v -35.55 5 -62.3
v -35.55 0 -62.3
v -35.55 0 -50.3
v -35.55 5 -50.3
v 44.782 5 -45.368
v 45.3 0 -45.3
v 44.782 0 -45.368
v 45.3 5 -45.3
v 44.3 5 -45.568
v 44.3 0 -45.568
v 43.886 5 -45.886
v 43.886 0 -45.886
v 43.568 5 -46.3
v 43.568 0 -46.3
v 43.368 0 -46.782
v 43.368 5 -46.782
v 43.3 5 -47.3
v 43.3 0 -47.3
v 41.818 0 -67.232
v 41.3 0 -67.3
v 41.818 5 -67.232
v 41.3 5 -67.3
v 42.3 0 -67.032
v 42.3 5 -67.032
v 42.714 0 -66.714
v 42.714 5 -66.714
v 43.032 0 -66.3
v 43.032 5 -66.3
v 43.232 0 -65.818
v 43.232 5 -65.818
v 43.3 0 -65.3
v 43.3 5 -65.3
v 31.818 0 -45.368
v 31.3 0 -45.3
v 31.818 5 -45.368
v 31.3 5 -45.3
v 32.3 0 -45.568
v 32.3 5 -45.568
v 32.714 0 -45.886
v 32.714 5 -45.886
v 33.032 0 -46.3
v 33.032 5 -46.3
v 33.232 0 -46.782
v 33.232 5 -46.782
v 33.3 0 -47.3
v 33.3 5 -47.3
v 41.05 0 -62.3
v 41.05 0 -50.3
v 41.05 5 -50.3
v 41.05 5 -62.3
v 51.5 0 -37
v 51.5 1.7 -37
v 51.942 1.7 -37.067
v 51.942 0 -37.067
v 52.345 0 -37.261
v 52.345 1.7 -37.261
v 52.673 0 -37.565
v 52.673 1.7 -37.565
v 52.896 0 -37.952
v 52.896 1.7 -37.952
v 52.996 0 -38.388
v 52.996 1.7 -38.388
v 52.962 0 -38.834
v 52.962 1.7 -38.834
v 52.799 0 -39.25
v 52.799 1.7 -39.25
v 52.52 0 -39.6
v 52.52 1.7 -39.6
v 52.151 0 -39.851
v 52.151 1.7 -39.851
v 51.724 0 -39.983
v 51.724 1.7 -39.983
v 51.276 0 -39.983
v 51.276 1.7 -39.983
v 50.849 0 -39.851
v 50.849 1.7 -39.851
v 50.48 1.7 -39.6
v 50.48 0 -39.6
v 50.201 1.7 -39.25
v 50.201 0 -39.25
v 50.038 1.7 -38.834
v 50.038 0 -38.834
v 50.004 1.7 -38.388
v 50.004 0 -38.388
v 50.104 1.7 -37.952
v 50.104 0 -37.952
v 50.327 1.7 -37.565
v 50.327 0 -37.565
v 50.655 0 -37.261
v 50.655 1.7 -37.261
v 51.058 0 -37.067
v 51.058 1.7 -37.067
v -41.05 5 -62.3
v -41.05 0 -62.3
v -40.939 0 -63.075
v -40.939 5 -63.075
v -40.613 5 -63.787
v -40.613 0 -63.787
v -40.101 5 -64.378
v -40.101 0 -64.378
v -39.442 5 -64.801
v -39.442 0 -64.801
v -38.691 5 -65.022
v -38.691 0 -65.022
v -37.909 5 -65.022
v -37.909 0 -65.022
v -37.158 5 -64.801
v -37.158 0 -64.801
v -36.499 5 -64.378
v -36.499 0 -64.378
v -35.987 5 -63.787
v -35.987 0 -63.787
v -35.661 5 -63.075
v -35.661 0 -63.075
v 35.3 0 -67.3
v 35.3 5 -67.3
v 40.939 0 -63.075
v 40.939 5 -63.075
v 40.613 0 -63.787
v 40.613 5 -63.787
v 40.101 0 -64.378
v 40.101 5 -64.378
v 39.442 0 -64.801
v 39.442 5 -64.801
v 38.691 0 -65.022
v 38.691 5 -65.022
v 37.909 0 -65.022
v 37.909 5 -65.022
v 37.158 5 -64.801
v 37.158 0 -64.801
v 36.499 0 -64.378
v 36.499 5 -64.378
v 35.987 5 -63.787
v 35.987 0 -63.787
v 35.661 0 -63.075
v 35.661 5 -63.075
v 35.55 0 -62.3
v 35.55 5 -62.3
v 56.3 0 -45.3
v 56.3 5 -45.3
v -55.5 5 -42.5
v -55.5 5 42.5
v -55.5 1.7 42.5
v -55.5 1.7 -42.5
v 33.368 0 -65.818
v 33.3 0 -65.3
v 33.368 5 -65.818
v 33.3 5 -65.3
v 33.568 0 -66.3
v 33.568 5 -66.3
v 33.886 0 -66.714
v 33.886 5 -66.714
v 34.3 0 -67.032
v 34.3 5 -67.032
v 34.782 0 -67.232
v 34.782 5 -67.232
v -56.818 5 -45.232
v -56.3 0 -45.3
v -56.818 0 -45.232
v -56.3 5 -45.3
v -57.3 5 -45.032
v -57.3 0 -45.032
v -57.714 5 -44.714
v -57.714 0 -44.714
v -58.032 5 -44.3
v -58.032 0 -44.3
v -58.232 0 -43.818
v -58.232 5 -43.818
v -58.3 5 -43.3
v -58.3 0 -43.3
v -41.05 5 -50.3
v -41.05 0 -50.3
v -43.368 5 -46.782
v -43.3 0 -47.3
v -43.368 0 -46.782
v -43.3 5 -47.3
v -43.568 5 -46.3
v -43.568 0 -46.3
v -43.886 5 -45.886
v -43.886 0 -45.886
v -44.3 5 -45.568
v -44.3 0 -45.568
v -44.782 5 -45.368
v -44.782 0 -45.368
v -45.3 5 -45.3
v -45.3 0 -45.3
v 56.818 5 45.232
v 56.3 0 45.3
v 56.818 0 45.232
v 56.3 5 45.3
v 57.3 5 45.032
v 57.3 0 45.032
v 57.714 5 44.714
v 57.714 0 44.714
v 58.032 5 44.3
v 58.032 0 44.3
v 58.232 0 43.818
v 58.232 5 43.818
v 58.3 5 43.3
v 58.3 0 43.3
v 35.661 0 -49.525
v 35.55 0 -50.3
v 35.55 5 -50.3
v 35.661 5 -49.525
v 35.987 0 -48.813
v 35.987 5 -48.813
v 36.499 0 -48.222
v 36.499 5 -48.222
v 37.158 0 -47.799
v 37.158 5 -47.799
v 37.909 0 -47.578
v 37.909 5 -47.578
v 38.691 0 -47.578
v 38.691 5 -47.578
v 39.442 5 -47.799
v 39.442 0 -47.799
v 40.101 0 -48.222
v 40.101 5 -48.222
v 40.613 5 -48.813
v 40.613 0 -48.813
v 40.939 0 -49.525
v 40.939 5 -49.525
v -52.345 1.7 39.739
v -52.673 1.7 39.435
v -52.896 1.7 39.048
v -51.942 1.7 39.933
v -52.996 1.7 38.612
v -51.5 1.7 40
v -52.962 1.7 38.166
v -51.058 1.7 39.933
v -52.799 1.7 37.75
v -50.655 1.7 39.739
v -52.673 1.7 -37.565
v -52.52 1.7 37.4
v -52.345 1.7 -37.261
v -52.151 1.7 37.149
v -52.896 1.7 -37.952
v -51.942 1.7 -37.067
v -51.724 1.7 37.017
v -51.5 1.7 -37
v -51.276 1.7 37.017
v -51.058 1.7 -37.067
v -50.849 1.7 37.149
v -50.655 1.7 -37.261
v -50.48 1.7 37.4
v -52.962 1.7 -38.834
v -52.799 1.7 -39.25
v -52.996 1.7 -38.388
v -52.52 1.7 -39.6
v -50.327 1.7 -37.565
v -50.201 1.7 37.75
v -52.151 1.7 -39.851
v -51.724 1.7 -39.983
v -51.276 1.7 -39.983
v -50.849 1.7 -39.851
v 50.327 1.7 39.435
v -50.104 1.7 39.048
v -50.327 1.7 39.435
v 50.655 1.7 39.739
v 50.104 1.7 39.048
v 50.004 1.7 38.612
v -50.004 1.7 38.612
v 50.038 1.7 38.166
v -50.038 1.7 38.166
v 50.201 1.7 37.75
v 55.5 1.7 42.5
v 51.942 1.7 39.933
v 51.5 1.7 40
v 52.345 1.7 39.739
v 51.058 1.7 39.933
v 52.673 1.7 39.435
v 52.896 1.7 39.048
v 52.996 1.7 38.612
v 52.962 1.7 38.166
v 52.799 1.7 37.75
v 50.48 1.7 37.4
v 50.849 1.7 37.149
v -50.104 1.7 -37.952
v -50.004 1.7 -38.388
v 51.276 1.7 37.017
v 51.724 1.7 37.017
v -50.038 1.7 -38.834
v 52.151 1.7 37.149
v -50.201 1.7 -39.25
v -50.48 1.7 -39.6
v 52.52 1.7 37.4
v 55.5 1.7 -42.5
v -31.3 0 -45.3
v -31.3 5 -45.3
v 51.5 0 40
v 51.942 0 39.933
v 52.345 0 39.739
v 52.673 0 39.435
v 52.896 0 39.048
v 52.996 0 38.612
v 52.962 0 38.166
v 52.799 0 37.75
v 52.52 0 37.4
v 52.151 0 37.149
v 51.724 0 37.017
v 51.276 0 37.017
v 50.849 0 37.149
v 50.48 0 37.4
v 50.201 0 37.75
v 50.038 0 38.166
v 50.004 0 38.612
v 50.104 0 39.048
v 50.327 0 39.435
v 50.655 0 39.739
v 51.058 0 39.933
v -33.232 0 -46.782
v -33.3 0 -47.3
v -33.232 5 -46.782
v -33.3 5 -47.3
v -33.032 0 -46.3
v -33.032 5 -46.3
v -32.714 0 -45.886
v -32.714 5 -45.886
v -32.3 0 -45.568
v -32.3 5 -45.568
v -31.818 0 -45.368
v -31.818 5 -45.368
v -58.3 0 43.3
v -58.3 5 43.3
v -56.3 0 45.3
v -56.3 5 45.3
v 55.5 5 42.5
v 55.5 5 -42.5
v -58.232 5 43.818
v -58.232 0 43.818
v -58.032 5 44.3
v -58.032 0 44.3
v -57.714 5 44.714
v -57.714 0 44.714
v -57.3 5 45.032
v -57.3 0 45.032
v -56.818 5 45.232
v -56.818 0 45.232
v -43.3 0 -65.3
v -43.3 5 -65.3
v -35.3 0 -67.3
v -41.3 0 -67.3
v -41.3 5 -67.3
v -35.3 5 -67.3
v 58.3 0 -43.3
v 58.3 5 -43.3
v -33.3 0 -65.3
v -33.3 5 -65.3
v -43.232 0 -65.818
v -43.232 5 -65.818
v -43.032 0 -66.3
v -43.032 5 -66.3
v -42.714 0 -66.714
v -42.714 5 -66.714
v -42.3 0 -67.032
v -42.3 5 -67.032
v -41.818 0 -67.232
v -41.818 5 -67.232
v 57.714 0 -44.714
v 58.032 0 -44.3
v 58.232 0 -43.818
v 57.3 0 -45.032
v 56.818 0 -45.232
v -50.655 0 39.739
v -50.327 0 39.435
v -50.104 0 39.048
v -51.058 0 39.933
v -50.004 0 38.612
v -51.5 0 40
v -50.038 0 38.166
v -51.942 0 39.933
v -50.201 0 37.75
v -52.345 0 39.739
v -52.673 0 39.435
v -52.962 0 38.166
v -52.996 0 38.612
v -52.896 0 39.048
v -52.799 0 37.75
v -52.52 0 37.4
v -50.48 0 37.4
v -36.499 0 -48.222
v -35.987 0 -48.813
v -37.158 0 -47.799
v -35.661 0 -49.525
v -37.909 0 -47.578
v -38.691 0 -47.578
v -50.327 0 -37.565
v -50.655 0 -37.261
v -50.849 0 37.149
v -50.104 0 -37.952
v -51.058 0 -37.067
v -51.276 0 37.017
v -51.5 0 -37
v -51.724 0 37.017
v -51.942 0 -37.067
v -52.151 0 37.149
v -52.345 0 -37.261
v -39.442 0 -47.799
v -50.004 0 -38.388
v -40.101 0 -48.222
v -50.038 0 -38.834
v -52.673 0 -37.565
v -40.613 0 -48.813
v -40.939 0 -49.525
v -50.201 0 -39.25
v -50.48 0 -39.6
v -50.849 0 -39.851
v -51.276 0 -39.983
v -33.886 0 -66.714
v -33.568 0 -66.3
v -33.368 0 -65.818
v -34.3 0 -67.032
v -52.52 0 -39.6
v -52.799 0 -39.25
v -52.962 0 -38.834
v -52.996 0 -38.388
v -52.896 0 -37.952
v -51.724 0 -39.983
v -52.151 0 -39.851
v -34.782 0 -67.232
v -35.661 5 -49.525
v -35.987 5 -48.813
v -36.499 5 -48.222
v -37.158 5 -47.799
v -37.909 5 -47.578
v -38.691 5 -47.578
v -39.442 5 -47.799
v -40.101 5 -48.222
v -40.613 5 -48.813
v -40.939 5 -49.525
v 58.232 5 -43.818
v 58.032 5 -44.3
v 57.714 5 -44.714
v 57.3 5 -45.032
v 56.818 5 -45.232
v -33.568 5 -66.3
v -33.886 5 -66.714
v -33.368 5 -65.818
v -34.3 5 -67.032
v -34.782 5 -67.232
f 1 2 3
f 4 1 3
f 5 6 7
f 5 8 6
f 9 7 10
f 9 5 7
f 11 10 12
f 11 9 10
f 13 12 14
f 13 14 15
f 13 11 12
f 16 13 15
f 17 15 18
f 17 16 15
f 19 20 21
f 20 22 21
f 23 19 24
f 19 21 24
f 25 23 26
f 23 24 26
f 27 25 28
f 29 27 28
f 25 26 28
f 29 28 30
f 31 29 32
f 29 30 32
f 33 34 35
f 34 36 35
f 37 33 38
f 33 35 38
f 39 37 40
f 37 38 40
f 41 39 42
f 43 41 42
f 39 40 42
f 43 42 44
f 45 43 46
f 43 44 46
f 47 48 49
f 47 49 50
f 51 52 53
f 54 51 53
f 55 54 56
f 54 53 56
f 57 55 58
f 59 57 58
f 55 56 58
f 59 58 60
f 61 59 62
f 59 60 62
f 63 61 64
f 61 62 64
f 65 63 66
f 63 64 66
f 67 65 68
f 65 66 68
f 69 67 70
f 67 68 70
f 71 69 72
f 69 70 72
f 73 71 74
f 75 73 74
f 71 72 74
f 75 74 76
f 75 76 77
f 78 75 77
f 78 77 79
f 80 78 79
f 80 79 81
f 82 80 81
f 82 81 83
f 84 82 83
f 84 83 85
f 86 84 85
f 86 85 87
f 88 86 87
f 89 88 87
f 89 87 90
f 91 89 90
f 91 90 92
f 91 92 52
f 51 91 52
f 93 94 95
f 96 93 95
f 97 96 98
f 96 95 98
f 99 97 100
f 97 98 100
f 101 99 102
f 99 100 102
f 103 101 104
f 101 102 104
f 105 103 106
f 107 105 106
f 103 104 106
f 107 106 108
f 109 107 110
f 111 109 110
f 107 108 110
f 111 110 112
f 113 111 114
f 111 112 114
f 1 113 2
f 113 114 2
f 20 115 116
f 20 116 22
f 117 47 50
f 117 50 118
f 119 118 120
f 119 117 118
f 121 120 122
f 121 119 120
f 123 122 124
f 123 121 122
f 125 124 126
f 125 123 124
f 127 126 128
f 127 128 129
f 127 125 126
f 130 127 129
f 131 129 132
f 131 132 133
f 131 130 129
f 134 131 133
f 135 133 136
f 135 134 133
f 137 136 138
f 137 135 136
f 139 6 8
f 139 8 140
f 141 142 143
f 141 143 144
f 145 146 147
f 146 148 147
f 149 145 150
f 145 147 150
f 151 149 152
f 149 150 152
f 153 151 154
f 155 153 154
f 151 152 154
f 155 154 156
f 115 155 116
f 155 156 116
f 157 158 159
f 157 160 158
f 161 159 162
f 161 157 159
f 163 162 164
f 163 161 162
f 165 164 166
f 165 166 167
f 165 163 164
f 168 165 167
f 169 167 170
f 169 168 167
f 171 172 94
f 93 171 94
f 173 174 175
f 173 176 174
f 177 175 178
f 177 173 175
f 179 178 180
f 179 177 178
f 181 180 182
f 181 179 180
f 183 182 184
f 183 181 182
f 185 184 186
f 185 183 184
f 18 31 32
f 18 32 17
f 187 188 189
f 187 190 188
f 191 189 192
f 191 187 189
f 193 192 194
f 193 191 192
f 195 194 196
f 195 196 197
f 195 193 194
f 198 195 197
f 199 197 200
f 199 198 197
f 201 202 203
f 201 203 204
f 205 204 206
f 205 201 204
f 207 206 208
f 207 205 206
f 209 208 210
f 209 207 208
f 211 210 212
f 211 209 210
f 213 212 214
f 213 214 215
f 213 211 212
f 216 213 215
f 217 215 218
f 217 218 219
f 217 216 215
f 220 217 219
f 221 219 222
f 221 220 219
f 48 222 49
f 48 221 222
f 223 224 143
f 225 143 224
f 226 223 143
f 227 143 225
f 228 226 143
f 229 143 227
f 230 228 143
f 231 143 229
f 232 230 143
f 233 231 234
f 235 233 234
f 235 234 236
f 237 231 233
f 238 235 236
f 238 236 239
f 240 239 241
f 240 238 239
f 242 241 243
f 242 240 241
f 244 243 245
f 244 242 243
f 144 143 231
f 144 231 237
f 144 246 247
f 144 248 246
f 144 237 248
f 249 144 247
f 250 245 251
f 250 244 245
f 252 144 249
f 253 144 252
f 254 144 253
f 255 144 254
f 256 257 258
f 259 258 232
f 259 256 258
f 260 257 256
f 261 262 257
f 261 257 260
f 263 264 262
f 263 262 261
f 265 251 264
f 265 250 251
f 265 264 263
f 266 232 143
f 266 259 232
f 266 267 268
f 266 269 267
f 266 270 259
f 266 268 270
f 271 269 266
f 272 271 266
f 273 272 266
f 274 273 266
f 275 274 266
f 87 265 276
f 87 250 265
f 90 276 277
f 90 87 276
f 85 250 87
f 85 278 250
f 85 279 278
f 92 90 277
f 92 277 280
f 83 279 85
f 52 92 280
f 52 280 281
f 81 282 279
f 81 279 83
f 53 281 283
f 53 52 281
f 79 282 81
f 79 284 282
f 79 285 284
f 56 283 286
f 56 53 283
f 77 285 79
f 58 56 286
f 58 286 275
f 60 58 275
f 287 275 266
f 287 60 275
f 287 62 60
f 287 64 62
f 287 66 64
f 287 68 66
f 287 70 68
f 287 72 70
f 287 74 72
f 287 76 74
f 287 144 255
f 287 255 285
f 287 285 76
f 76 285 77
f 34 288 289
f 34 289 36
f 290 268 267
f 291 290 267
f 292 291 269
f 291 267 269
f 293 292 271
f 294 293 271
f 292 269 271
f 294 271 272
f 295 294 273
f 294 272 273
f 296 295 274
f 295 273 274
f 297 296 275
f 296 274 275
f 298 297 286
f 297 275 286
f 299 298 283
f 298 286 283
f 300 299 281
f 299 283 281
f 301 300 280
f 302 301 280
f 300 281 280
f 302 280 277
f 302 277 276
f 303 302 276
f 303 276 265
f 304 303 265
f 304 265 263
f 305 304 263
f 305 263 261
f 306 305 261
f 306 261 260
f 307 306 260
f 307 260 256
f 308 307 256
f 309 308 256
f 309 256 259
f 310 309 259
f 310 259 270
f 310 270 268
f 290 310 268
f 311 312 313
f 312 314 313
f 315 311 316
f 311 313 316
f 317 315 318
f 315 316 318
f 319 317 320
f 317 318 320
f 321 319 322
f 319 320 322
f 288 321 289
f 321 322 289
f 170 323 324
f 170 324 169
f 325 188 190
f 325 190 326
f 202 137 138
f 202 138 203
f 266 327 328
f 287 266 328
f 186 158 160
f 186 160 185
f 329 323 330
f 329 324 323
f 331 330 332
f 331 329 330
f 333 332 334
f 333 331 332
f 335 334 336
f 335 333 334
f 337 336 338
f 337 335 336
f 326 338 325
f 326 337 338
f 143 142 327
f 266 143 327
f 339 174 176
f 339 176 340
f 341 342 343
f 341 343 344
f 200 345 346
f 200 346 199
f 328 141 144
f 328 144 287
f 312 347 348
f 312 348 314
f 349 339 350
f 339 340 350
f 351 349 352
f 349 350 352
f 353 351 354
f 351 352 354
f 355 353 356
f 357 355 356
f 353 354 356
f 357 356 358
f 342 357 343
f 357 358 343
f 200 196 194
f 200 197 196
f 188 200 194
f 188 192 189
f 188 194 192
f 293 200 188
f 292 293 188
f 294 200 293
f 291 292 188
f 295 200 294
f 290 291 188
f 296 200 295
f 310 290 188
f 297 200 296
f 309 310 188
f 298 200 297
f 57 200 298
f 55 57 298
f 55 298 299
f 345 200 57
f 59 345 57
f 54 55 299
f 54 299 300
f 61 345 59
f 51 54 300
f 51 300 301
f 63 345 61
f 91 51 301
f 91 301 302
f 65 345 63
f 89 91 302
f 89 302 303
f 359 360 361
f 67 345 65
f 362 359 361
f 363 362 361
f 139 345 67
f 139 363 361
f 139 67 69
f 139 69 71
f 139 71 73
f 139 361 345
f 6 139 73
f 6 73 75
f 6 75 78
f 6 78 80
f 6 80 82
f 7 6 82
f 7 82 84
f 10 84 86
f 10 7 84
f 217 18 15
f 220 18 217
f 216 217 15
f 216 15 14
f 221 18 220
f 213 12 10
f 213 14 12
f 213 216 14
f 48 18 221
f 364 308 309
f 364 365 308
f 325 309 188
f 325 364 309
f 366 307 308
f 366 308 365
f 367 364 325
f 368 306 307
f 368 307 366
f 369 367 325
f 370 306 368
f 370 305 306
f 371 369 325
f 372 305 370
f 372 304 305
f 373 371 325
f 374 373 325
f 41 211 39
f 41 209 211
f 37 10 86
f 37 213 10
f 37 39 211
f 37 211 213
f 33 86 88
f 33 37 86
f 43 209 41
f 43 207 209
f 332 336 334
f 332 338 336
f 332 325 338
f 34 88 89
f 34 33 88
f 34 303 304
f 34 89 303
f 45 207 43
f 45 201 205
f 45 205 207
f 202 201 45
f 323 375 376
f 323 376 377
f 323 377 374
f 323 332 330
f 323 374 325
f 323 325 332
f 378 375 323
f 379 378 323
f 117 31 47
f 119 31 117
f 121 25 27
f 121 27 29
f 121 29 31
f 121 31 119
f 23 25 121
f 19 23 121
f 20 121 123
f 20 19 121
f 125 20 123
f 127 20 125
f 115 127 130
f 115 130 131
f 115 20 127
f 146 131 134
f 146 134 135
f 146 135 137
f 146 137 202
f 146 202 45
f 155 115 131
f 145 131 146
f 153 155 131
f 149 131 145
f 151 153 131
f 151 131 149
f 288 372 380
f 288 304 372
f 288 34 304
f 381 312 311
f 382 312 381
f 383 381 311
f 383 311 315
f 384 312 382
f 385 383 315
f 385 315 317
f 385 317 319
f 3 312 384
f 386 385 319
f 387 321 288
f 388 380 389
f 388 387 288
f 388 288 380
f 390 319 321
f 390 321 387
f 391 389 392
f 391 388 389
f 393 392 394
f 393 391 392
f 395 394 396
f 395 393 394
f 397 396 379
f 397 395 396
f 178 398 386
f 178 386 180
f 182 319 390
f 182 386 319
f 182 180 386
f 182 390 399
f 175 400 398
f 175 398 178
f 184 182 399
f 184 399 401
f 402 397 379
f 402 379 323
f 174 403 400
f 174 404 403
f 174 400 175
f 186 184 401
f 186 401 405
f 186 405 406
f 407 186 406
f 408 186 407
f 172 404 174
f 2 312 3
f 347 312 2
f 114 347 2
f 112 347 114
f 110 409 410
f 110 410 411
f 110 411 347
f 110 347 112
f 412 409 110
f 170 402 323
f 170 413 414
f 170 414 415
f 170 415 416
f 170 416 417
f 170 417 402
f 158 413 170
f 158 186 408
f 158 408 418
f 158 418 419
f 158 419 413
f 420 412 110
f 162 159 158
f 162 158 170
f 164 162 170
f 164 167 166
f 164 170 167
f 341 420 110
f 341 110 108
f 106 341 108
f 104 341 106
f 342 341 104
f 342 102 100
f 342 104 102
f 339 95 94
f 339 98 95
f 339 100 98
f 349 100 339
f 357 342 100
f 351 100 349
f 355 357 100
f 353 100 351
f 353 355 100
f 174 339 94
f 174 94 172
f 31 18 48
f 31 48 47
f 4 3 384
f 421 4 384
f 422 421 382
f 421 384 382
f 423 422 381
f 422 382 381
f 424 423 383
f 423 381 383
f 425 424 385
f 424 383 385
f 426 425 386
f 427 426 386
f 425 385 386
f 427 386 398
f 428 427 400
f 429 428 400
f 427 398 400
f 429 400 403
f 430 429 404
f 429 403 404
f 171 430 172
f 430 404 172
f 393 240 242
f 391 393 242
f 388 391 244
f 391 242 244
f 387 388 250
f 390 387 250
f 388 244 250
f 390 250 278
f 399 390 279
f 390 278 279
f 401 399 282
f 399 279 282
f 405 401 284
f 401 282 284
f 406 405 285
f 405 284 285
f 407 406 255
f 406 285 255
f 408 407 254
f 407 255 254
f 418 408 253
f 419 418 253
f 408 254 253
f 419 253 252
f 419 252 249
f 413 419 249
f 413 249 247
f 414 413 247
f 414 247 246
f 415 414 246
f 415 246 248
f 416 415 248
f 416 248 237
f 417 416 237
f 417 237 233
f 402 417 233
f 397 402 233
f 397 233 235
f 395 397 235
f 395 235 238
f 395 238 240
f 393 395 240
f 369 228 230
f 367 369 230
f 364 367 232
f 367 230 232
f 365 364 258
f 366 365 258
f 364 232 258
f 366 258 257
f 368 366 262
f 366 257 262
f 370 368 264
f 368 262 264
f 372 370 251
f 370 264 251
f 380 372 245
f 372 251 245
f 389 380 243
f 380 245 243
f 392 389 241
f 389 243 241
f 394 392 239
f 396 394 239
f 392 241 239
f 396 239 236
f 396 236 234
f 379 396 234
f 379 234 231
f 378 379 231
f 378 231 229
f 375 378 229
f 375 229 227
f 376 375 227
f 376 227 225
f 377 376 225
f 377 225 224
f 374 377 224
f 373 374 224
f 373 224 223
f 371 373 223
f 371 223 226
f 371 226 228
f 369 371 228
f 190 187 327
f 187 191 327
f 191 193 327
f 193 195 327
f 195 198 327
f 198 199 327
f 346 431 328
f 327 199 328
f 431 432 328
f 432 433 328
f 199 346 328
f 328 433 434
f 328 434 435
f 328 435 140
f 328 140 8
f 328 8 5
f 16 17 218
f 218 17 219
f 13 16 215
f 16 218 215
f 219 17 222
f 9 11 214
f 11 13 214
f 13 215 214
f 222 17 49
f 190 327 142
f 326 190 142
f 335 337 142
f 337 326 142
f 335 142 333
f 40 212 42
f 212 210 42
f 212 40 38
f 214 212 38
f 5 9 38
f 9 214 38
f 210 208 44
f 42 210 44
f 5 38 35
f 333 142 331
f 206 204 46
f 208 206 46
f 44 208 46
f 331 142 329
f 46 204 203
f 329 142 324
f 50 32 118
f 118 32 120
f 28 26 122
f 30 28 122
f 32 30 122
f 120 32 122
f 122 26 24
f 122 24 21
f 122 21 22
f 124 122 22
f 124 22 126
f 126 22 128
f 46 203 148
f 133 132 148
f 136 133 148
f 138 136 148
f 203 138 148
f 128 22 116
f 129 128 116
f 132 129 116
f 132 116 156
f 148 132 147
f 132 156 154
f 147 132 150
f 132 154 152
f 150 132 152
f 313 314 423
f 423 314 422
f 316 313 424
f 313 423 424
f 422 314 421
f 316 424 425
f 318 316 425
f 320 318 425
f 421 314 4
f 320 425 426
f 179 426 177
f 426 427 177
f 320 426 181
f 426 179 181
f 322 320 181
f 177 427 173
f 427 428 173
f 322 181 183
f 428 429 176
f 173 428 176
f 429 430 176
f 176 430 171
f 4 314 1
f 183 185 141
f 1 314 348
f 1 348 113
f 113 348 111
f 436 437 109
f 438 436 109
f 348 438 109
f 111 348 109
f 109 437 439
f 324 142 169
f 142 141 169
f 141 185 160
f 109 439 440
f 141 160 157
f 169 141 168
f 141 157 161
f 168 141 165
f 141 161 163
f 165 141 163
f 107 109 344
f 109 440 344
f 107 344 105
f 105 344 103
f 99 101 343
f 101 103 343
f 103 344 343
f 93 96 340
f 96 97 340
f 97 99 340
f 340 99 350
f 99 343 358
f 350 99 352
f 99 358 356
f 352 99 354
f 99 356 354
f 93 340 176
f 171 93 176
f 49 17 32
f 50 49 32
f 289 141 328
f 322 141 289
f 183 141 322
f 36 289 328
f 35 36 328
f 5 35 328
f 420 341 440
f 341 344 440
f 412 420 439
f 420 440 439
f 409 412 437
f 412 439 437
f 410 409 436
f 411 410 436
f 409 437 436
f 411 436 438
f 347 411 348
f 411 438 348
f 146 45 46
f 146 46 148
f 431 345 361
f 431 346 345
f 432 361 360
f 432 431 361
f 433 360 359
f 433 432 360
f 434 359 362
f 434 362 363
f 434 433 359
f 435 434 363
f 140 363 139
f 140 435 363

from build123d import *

# Parameters (mm, degrees)
EXTRUDE_1_DEPTH     = 5
SKETCH_4_R          = 1.5
CUT_EXTRUDE_4_DEPTH = 90.180603272
SKETCH_4_3_W        = 111
SKETCH_4_3_H        = 85
SKETCH_4_3_R        = 1.5
CUT_EXTRUDE_5_DEPTH = 3.3
FILLET_1_R          = 2


with BuildPart() as part:
    # 草图2 → 凸台-拉伸1 (new body)
    with BuildSketch(Plane(origin=(0, 0, 0), x_dir=(1, 0, 0), z_dir=(0, 1, 0))):
        Polygon((-43.3, 45.3), (-43.3, 67.3), (-33.3, 67.3), (-33.3, 45.3), (33.3, 45.3), (33.3, 67.3), (43.3, 67.3), (43.3, 45.3), (58.3, 45.3), (58.3, -45.3), (-58.3, -45.3), (-58.3, 45.3), align=None)
        with BuildLine():
            Line((-35.55, 62.3), (-35.55, 50.3))
            ThreePointArc((-35.55, 50.3), (-38.3, 47.55), (-41.05, 50.3))
            Line((-41.05, 50.3), (-41.05, 62.3))
            ThreePointArc((-41.05, 62.3), (-38.3, 65.05), (-35.55, 62.3))
        make_face(mode=Mode.SUBTRACT)
        with BuildLine():
            Line((35.55, 62.3), (35.55, 50.3))
            ThreePointArc((35.55, 50.3), (38.3, 47.55), (41.05, 50.3))
            Line((41.05, 50.3), (41.05, 62.3))
            ThreePointArc((41.05, 62.3), (38.3, 65.05), (35.55, 62.3))
        make_face(mode=Mode.SUBTRACT)
    extrude(amount=EXTRUDE_1_DEPTH)

    # 草图4 → 切除-拉伸4 (cut, through all)
    with BuildSketch(Plane(origin=(0, 5, 0), x_dir=(1, 0, 0), z_dir=(0, 1, 0))):
        with Locations((-51.5, 38.5)):
            Circle(SKETCH_4_R)
        with Locations((-51.5, -38.5)):
            Circle(SKETCH_4_R)
        with Locations((51.5, -38.5)):
            Circle(SKETCH_4_R)
        with Locations((51.5, 38.5)):
            Circle(SKETCH_4_R)
    extrude(amount=-CUT_EXTRUDE_4_DEPTH, mode=Mode.SUBTRACT)

    # 草图4<3> → 切除-拉伸5 (cut)
    with BuildSketch(Plane(origin=(0, 5, 0), x_dir=(1, 0, 0), z_dir=(0, 1, 0))):
        Rectangle(SKETCH_4_3_W, SKETCH_4_3_H)
        with Locations((-51.5, -38.5)):
            Circle(SKETCH_4_3_R, mode=Mode.SUBTRACT)
        with Locations((51.5, -38.5)):
            Circle(SKETCH_4_3_R, mode=Mode.SUBTRACT)
        with Locations((-51.5, 38.5)):
            Circle(SKETCH_4_3_R, mode=Mode.SUBTRACT)
        with Locations((51.5, 38.5)):
            Circle(SKETCH_4_3_R, mode=Mode.SUBTRACT)
    extrude(amount=-CUT_EXTRUDE_5_DEPTH, mode=Mode.SUBTRACT)

    # 圆角1
    fillet_1_edges = [part.edges().sort_by_distance(p)[0] for p in [
        (58.3, 2.5, 45.3),
        (-58.3, 2.5, 45.3),
        (-58.3, 2.5, -45.3),
        (-43.3, 2.5, -45.3),
        (-43.3, 2.5, -67.3),
        (-33.3, 2.5, -67.3),
        (-33.3, 2.5, -45.3),
        (33.3, 2.5, -45.3),
        (33.3, 2.5, -67.3),
        (43.3, 2.5, -67.3),
        (43.3, 2.5, -45.3),
        (58.3, 2.5, -45.3),
    ]]
    fillet(fillet_1_edges, radius=FILLET_1_R)


solid = part.part
